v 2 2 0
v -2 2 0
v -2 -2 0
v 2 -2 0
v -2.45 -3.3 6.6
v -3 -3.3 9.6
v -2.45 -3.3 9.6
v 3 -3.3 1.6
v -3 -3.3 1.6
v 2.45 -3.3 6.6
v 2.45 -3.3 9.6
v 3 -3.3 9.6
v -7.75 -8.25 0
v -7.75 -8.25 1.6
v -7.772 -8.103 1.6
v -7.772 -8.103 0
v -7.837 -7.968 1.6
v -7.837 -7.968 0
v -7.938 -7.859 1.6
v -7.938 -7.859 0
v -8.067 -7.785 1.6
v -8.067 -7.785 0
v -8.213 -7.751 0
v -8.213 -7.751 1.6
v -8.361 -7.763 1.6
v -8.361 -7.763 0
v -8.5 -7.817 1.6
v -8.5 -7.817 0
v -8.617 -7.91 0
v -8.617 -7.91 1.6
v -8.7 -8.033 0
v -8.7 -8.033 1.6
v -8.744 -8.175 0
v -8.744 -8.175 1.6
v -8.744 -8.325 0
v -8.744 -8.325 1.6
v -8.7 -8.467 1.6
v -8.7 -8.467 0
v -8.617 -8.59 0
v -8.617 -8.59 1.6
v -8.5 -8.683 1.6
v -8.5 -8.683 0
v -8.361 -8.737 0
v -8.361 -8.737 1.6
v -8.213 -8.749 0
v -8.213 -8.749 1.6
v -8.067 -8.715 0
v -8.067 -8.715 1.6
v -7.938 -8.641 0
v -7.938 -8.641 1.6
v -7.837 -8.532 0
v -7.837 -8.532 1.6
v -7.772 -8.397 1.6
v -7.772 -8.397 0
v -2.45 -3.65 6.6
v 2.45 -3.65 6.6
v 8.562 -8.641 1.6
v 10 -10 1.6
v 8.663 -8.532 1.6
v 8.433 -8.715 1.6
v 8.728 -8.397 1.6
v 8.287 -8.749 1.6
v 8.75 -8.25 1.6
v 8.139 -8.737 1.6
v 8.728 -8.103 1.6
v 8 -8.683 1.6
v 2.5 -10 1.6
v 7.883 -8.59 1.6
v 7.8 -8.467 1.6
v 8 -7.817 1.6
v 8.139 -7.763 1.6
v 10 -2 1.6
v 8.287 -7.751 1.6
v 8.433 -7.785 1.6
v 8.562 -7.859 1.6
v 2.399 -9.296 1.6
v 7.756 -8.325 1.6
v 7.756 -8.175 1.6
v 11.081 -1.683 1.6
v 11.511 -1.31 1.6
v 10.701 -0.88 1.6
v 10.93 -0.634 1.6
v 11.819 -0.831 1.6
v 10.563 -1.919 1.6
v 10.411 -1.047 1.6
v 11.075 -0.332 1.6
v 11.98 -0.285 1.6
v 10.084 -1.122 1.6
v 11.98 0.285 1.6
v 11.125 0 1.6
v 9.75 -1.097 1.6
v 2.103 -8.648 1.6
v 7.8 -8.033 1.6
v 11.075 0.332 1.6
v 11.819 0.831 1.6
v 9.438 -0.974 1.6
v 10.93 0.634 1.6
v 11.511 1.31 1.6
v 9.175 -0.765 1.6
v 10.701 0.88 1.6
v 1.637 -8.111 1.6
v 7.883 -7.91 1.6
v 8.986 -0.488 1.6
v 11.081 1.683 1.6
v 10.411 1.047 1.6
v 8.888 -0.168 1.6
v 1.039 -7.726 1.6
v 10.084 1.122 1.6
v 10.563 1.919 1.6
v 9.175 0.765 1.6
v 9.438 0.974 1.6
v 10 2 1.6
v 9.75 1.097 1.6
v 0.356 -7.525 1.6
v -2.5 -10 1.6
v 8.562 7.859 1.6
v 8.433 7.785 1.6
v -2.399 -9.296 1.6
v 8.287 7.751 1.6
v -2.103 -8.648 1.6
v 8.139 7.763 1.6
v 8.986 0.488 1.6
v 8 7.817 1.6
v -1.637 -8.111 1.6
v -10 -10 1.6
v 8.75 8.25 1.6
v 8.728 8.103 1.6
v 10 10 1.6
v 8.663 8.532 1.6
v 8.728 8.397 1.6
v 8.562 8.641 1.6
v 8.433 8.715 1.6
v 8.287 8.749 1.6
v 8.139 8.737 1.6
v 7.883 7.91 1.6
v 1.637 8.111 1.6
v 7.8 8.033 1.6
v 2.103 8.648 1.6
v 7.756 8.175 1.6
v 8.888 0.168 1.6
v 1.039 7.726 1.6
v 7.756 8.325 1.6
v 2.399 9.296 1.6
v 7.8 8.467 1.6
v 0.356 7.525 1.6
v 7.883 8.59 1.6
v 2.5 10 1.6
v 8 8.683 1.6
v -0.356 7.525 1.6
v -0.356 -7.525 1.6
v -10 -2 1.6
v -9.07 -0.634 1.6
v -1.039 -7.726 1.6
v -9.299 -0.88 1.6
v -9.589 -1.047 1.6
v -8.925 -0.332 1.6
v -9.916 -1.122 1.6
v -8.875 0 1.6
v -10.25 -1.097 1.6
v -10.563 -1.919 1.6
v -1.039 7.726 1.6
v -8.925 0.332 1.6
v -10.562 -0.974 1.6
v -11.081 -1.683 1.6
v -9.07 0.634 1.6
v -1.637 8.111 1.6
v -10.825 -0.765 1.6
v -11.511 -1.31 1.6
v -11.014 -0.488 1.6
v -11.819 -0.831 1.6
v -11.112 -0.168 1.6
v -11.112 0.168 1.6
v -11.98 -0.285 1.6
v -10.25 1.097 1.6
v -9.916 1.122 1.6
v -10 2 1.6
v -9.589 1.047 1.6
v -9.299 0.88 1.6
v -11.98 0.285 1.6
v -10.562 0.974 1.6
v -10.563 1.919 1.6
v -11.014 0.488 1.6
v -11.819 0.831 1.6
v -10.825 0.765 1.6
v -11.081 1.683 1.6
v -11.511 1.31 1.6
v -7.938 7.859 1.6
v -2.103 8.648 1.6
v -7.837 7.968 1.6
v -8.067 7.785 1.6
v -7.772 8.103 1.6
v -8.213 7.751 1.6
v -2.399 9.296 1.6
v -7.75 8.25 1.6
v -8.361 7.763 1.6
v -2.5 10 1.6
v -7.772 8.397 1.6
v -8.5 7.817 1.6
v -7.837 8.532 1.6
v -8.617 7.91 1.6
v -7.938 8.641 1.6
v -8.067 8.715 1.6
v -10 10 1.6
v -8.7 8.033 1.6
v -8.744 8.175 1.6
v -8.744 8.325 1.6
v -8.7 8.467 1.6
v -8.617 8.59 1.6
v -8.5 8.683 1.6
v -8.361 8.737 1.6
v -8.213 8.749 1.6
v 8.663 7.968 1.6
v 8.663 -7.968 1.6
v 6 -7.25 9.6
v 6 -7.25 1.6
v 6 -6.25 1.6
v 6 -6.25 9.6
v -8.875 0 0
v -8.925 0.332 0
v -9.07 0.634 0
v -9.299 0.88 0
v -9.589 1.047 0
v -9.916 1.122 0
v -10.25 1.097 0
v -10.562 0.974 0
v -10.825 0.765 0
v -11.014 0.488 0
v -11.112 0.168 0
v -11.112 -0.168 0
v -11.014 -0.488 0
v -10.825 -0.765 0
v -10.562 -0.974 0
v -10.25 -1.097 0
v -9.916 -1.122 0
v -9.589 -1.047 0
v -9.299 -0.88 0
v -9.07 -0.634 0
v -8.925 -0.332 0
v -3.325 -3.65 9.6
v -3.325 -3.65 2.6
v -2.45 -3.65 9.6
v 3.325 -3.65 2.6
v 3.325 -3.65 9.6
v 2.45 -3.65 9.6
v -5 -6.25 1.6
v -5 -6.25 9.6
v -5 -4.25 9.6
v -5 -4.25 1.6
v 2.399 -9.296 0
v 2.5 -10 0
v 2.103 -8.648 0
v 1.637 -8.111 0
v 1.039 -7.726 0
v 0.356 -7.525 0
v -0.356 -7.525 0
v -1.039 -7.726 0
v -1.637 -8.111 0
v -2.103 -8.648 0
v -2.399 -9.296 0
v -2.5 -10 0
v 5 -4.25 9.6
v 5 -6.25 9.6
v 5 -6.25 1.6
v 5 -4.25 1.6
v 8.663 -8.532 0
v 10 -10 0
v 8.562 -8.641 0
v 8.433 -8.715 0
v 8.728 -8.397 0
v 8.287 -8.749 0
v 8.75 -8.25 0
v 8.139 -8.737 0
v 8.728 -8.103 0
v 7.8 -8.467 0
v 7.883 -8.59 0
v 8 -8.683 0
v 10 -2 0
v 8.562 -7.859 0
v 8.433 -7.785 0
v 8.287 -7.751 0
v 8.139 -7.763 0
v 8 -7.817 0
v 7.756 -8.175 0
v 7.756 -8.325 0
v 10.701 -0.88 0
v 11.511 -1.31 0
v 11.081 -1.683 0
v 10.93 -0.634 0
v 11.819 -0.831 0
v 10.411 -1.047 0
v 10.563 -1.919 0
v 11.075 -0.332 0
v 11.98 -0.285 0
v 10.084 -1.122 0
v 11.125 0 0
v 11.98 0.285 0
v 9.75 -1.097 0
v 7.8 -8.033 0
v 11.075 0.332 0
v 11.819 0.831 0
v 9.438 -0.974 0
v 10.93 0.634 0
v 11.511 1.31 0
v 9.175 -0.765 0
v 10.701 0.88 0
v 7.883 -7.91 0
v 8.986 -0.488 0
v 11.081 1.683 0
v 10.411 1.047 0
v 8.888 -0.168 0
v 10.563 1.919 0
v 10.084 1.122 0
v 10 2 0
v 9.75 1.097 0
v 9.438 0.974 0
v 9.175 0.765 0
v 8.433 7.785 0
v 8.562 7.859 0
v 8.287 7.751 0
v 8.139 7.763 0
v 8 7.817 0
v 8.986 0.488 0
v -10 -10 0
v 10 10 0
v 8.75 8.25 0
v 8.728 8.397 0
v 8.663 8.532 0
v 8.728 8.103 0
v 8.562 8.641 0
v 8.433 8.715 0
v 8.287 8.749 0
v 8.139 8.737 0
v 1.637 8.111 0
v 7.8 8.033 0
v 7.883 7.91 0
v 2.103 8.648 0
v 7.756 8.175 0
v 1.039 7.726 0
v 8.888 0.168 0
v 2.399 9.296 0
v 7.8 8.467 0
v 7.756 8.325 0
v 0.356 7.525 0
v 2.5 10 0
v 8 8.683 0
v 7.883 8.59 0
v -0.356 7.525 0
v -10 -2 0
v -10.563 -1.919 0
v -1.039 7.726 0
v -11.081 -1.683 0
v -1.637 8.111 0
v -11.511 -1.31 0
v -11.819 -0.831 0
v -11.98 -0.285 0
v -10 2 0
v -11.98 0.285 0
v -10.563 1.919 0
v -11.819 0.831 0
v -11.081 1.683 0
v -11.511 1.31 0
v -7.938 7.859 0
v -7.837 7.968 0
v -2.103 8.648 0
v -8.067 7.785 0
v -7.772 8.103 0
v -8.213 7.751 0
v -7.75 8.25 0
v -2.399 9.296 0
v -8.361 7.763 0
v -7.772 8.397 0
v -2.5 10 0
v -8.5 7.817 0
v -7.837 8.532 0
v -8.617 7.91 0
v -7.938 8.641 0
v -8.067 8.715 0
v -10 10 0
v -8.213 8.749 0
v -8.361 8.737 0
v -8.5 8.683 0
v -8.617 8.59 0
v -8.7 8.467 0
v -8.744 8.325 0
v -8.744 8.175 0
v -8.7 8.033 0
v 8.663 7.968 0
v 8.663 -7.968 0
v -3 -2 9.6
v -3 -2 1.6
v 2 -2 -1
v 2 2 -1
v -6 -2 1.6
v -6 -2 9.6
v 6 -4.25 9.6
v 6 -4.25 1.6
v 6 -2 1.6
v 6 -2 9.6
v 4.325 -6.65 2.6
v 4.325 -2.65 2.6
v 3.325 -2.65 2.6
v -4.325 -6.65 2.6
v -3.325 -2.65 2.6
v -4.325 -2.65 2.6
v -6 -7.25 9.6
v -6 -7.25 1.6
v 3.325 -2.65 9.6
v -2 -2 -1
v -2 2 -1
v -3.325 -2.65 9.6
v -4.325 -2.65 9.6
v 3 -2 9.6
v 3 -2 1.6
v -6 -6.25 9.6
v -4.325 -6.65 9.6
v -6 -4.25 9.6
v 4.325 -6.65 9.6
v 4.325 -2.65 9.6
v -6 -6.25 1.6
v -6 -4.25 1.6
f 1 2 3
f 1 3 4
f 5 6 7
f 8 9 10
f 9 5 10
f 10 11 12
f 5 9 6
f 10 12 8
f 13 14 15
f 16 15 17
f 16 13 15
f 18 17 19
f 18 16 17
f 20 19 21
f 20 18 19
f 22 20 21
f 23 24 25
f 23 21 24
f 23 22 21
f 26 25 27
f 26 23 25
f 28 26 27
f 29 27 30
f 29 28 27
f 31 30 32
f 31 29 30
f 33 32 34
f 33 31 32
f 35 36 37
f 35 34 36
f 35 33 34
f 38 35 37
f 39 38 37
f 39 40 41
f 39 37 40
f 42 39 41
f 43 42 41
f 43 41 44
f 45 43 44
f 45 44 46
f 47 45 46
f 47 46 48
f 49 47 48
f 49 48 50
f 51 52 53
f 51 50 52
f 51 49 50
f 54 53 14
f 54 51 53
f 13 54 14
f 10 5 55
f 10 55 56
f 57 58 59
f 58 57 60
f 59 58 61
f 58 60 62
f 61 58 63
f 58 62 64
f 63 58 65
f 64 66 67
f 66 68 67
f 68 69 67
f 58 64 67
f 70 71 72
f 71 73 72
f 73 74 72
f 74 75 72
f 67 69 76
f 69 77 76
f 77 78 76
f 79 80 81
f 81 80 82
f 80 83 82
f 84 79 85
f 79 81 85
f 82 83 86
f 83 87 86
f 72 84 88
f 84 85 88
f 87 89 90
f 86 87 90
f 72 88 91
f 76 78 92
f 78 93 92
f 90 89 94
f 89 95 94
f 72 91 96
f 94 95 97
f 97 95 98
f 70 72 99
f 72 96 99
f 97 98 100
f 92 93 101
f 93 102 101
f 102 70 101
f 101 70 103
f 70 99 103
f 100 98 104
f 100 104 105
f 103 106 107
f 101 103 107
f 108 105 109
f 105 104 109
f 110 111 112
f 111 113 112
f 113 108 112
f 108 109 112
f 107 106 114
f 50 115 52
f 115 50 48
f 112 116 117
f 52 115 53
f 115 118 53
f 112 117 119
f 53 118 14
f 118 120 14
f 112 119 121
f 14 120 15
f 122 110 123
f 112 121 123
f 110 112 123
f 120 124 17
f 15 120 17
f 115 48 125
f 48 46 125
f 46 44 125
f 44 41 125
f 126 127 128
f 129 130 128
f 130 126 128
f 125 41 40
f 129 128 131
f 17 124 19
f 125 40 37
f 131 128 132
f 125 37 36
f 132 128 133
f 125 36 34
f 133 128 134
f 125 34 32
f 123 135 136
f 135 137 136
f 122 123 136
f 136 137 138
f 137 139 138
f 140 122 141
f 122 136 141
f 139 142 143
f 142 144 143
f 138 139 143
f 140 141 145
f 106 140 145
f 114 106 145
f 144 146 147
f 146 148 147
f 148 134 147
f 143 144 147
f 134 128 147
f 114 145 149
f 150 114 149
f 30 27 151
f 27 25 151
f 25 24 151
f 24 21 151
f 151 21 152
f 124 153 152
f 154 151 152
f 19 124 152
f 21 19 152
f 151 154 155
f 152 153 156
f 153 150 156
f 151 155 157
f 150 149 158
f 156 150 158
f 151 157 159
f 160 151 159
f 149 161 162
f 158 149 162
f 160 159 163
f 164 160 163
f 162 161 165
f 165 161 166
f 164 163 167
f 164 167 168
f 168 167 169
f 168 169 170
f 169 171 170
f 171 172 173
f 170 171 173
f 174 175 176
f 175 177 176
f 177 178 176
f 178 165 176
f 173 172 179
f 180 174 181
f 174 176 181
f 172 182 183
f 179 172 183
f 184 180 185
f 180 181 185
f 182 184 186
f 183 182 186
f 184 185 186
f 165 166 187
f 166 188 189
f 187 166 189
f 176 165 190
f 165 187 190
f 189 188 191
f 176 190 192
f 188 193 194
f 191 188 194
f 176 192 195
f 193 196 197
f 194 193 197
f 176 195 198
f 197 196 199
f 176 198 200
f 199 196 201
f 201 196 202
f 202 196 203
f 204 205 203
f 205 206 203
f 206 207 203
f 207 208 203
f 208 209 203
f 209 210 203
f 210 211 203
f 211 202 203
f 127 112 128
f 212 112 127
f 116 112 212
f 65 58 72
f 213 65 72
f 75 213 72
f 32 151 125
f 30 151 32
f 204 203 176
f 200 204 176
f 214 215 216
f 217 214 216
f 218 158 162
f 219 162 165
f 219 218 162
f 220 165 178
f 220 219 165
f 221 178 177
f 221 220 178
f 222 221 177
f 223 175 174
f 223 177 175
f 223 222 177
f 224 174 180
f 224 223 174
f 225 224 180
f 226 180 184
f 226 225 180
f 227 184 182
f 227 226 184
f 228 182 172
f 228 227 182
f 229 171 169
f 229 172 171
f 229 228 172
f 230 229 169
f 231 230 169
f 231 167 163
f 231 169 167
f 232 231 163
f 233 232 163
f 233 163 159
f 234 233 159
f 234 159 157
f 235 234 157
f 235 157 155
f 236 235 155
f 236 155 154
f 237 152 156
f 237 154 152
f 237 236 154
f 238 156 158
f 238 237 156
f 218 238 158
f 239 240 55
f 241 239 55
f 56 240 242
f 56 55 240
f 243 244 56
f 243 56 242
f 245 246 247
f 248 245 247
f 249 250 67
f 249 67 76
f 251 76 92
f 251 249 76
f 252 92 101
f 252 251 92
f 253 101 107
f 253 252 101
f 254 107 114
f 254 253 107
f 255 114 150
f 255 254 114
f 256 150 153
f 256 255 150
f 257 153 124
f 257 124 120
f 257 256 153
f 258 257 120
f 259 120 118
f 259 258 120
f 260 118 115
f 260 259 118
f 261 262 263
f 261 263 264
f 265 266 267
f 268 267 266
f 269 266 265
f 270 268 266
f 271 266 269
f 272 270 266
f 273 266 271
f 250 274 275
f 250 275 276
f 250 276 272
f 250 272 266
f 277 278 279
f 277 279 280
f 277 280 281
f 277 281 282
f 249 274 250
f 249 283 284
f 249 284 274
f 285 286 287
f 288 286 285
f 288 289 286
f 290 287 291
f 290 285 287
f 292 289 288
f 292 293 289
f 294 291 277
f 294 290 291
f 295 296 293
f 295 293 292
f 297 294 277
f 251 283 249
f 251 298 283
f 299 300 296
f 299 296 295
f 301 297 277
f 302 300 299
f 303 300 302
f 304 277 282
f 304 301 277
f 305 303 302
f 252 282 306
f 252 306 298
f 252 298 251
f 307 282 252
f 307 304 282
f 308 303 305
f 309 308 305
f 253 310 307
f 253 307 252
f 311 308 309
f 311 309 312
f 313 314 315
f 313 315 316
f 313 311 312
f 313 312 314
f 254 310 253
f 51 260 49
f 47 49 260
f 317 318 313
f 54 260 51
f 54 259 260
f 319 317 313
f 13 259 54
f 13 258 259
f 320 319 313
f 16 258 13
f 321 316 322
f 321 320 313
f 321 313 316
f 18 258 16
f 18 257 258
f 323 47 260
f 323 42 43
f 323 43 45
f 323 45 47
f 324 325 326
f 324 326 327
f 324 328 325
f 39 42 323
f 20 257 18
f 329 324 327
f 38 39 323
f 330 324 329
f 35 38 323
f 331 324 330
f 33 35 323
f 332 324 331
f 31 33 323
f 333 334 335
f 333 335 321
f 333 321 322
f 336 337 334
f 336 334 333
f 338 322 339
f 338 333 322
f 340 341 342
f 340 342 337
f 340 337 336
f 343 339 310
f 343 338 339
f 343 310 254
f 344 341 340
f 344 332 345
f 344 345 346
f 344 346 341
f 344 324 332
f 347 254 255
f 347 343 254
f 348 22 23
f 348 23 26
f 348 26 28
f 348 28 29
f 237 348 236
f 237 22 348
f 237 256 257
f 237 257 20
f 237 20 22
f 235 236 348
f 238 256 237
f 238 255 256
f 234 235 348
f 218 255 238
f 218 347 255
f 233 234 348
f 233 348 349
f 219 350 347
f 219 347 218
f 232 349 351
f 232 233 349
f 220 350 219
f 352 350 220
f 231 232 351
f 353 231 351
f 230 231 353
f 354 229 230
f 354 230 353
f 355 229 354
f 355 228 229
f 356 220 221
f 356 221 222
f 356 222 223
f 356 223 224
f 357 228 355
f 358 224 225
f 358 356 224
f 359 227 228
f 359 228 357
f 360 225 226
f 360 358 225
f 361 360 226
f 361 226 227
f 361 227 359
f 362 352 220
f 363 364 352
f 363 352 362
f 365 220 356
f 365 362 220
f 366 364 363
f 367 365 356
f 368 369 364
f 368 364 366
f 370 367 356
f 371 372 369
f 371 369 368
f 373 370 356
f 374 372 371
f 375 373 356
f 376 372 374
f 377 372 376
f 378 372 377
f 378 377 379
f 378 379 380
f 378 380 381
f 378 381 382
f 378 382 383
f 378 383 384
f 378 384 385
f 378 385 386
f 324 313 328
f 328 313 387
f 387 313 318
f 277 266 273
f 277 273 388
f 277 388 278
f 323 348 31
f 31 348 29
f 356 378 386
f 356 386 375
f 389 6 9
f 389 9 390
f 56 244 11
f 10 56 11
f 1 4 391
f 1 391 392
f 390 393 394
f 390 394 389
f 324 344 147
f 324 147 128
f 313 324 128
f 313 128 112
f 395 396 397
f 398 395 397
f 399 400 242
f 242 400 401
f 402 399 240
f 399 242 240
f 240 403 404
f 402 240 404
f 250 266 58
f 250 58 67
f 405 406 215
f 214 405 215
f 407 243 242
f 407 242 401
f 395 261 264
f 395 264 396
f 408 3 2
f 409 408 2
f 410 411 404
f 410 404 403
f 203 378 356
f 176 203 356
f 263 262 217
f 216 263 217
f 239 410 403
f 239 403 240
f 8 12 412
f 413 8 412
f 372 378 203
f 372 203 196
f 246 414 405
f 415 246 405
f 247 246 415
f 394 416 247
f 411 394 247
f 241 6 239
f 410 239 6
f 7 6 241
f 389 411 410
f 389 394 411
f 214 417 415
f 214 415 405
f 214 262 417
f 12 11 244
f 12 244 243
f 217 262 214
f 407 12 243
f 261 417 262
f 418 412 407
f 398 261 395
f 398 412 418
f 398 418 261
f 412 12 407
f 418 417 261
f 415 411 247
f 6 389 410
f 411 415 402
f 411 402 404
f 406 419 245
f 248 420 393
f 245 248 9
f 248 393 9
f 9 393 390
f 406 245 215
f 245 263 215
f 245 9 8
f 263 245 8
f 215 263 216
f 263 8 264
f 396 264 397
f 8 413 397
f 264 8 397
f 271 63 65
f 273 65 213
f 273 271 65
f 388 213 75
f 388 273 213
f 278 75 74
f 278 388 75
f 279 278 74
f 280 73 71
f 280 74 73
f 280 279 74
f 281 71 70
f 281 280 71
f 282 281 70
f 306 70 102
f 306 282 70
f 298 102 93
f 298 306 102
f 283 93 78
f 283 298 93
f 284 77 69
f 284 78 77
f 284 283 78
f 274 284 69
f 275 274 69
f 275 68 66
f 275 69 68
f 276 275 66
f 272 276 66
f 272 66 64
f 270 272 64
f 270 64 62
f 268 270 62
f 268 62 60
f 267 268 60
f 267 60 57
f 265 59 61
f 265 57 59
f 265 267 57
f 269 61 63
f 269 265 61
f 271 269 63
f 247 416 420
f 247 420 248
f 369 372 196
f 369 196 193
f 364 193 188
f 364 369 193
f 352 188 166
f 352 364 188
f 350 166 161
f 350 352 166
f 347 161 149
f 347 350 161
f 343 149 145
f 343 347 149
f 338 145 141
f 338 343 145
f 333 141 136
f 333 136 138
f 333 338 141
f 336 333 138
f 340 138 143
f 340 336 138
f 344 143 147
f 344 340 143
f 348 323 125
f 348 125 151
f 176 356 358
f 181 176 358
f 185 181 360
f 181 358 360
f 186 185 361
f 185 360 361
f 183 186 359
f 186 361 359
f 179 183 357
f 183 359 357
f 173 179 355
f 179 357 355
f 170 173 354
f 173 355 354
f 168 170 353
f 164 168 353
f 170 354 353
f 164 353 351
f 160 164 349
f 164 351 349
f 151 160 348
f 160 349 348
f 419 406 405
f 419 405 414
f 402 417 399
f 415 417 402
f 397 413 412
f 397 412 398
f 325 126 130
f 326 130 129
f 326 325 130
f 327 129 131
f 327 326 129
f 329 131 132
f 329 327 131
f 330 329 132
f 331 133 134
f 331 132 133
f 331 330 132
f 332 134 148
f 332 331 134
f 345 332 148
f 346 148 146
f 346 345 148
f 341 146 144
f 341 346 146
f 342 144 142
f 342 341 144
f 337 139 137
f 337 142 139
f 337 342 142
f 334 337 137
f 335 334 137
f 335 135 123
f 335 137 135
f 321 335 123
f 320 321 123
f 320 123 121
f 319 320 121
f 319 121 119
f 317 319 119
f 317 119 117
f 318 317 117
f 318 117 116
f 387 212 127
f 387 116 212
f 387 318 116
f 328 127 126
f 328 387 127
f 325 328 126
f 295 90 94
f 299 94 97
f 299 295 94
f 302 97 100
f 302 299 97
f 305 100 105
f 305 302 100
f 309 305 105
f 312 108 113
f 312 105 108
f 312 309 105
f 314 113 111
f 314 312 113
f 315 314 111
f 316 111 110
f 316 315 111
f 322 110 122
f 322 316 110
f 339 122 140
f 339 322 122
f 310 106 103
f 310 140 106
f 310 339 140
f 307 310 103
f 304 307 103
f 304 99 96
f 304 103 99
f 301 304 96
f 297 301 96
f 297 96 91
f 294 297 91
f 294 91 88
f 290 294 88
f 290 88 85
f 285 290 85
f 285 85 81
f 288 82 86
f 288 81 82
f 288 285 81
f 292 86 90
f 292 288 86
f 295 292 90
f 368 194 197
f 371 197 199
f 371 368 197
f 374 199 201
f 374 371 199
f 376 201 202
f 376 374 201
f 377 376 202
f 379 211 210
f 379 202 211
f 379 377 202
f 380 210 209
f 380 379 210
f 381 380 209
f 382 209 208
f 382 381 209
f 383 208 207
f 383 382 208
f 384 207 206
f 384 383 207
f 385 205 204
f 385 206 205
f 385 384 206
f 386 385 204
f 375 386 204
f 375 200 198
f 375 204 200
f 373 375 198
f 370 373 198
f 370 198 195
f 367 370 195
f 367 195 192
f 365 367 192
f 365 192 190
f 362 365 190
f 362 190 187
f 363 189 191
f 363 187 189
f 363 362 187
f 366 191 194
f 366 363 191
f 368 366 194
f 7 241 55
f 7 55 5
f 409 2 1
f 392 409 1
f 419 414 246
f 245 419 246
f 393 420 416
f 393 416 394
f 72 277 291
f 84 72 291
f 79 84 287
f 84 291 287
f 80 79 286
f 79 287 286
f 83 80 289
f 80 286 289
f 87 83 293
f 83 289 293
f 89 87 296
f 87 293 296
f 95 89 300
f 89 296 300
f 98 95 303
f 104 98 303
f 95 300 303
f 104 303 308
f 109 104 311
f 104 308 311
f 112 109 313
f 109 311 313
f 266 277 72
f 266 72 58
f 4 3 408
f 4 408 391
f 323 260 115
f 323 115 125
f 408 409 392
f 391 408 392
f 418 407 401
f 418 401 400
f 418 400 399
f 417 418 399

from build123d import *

# Parameters (mm, degrees)
PAD_DEPTH       = 1.6
SKETCH001_R     = 1.125
POCKET_DEPTH    = 1.601
SKETCH002_R     = 0.5
POCKET001_DEPTH = 1.601
SKETCH004_W     = 4
SKETCH004_H     = 4
PAD001_DEPTH    = 1
SKETCH005_W     = 12
SKETCH005_H     = 5.25
PAD002_DEPTH    = 8
POCKET002_DEPTH = 7
SKETCH007_W     = 6
SKETCH007_H     = 1.3
POCKET003_DEPTH = 8
SKETCH008_W     = 2
SKETCH008_H     = 2
POCKET004_DEPTH = 8.001
SKETCH009_W     = 4.9
SKETCH009_H     = 2
POCKET005_DEPTH = 3


with BuildPart() as groveboard:
    # Sketch → Pad (new body)
    with BuildSketch(Plane.XY):
        with BuildLine():
            Line((-10, 10), (-2.5, 10))
            ThreePointArc((-2.5, 10), (0, 7.5), (2.5, 10))
            Line((2.5, 10), (10, 10))
            Line((10, 10), (10, 2))
            ThreePointArc((10, -2), (12, 0), (10, 2))
            Line((10, -2), (10, -10))
            Line((10, -10), (2.5, -10))
            ThreePointArc((2.5, -10), (0, -7.5), (-2.5, -10))
            Line((-2.5, -10), (-10, -10))
            Line((-10, -10), (-10, -2))
            ThreePointArc((-10, 2), (-12, 0), (-10, -2))
            Line((-10, 10), (-10, 2))
        make_face()
    extrude(amount=PAD_DEPTH)

    # Sketch001 → Pocket (cut, through all)
    with BuildSketch(Plane.XY):
        with Locations((-10, 0)):
            Circle(SKETCH001_R)
        with Locations((10, 0)):
            Circle(SKETCH001_R)
    extrude(amount=POCKET_DEPTH, mode=Mode.SUBTRACT)

    # Sketch002 → Pocket001 (cut, through all)
    with BuildSketch(Plane.XY):
        with Locations((-8.25, 8.25)):
            Circle(SKETCH002_R)
        with Locations((8.25, 8.25)):
            Circle(SKETCH002_R)
        with Locations((8.25, -8.25)):
            Circle(SKETCH002_R)
        with Locations((-8.25, -8.25)):
            Circle(SKETCH002_R)
    extrude(amount=POCKET001_DEPTH, mode=Mode.SUBTRACT)


with BuildPart() as rgbled:
    # Sketch004 → Pad001 (new body)
    with BuildSketch(Plane.XY):
        Rectangle(SKETCH004_W, SKETCH004_H)
    extrude(amount=-PAD001_DEPTH)


with BuildPart() as groveconnector:
    # Sketch005 (on DatumPlane) → Pad002 (new body)
    with BuildSketch(Plane.XY.offset(1.6)):
        with Locations((0, -4.625)):
            Rectangle(SKETCH005_W, SKETCH005_H)
    extrude(amount=PAD002_DEPTH)

    # Sketch006 (on DatumPlane) → Pocket002 (cut)
    with BuildSketch(Plane.XY.offset(9.6)):
        Polygon((4.325, -2.65), (4.325, -6.65), (-4.325, -6.65), (-4.325, -2.65), (-3.325, -2.65), (-3.325, -3.65), (3.325, -3.65), (3.325, -2.65), align=None)
    extrude(amount=-POCKET002_DEPTH, mode=Mode.SUBTRACT)

    # Sketch007 (on DatumPlane) → Pocket003 (cut)
    with BuildSketch(Plane.XY.offset(9.6)):
        with Locations((0, -2.65)):
            Rectangle(SKETCH007_W, SKETCH007_H)
    extrude(amount=-POCKET003_DEPTH, mode=Mode.SUBTRACT)

    # Sketch008 (on DatumPlane) → Pocket004 (cut, through all)
    with BuildSketch(Plane.XY.offset(9.6)):
        with Locations((-6, -5.25)):
            Rectangle(SKETCH008_W, SKETCH008_H)
        with Locations((6, -5.25)):
            Rectangle(SKETCH008_W, SKETCH008_H)
    extrude(amount=-POCKET004_DEPTH, mode=Mode.SUBTRACT)

    # Sketch009 (on DatumPlane) → Pocket005 (cut)
    with BuildSketch(Plane.XY.offset(9.6)):
        with Locations((0, -3.5)):
            Rectangle(SKETCH009_W, SKETCH009_H)
    extrude(amount=-POCKET005_DEPTH, mode=Mode.SUBTRACT)


solid = Compound([groveboard.part, rgbled.part, groveconnector.part])
